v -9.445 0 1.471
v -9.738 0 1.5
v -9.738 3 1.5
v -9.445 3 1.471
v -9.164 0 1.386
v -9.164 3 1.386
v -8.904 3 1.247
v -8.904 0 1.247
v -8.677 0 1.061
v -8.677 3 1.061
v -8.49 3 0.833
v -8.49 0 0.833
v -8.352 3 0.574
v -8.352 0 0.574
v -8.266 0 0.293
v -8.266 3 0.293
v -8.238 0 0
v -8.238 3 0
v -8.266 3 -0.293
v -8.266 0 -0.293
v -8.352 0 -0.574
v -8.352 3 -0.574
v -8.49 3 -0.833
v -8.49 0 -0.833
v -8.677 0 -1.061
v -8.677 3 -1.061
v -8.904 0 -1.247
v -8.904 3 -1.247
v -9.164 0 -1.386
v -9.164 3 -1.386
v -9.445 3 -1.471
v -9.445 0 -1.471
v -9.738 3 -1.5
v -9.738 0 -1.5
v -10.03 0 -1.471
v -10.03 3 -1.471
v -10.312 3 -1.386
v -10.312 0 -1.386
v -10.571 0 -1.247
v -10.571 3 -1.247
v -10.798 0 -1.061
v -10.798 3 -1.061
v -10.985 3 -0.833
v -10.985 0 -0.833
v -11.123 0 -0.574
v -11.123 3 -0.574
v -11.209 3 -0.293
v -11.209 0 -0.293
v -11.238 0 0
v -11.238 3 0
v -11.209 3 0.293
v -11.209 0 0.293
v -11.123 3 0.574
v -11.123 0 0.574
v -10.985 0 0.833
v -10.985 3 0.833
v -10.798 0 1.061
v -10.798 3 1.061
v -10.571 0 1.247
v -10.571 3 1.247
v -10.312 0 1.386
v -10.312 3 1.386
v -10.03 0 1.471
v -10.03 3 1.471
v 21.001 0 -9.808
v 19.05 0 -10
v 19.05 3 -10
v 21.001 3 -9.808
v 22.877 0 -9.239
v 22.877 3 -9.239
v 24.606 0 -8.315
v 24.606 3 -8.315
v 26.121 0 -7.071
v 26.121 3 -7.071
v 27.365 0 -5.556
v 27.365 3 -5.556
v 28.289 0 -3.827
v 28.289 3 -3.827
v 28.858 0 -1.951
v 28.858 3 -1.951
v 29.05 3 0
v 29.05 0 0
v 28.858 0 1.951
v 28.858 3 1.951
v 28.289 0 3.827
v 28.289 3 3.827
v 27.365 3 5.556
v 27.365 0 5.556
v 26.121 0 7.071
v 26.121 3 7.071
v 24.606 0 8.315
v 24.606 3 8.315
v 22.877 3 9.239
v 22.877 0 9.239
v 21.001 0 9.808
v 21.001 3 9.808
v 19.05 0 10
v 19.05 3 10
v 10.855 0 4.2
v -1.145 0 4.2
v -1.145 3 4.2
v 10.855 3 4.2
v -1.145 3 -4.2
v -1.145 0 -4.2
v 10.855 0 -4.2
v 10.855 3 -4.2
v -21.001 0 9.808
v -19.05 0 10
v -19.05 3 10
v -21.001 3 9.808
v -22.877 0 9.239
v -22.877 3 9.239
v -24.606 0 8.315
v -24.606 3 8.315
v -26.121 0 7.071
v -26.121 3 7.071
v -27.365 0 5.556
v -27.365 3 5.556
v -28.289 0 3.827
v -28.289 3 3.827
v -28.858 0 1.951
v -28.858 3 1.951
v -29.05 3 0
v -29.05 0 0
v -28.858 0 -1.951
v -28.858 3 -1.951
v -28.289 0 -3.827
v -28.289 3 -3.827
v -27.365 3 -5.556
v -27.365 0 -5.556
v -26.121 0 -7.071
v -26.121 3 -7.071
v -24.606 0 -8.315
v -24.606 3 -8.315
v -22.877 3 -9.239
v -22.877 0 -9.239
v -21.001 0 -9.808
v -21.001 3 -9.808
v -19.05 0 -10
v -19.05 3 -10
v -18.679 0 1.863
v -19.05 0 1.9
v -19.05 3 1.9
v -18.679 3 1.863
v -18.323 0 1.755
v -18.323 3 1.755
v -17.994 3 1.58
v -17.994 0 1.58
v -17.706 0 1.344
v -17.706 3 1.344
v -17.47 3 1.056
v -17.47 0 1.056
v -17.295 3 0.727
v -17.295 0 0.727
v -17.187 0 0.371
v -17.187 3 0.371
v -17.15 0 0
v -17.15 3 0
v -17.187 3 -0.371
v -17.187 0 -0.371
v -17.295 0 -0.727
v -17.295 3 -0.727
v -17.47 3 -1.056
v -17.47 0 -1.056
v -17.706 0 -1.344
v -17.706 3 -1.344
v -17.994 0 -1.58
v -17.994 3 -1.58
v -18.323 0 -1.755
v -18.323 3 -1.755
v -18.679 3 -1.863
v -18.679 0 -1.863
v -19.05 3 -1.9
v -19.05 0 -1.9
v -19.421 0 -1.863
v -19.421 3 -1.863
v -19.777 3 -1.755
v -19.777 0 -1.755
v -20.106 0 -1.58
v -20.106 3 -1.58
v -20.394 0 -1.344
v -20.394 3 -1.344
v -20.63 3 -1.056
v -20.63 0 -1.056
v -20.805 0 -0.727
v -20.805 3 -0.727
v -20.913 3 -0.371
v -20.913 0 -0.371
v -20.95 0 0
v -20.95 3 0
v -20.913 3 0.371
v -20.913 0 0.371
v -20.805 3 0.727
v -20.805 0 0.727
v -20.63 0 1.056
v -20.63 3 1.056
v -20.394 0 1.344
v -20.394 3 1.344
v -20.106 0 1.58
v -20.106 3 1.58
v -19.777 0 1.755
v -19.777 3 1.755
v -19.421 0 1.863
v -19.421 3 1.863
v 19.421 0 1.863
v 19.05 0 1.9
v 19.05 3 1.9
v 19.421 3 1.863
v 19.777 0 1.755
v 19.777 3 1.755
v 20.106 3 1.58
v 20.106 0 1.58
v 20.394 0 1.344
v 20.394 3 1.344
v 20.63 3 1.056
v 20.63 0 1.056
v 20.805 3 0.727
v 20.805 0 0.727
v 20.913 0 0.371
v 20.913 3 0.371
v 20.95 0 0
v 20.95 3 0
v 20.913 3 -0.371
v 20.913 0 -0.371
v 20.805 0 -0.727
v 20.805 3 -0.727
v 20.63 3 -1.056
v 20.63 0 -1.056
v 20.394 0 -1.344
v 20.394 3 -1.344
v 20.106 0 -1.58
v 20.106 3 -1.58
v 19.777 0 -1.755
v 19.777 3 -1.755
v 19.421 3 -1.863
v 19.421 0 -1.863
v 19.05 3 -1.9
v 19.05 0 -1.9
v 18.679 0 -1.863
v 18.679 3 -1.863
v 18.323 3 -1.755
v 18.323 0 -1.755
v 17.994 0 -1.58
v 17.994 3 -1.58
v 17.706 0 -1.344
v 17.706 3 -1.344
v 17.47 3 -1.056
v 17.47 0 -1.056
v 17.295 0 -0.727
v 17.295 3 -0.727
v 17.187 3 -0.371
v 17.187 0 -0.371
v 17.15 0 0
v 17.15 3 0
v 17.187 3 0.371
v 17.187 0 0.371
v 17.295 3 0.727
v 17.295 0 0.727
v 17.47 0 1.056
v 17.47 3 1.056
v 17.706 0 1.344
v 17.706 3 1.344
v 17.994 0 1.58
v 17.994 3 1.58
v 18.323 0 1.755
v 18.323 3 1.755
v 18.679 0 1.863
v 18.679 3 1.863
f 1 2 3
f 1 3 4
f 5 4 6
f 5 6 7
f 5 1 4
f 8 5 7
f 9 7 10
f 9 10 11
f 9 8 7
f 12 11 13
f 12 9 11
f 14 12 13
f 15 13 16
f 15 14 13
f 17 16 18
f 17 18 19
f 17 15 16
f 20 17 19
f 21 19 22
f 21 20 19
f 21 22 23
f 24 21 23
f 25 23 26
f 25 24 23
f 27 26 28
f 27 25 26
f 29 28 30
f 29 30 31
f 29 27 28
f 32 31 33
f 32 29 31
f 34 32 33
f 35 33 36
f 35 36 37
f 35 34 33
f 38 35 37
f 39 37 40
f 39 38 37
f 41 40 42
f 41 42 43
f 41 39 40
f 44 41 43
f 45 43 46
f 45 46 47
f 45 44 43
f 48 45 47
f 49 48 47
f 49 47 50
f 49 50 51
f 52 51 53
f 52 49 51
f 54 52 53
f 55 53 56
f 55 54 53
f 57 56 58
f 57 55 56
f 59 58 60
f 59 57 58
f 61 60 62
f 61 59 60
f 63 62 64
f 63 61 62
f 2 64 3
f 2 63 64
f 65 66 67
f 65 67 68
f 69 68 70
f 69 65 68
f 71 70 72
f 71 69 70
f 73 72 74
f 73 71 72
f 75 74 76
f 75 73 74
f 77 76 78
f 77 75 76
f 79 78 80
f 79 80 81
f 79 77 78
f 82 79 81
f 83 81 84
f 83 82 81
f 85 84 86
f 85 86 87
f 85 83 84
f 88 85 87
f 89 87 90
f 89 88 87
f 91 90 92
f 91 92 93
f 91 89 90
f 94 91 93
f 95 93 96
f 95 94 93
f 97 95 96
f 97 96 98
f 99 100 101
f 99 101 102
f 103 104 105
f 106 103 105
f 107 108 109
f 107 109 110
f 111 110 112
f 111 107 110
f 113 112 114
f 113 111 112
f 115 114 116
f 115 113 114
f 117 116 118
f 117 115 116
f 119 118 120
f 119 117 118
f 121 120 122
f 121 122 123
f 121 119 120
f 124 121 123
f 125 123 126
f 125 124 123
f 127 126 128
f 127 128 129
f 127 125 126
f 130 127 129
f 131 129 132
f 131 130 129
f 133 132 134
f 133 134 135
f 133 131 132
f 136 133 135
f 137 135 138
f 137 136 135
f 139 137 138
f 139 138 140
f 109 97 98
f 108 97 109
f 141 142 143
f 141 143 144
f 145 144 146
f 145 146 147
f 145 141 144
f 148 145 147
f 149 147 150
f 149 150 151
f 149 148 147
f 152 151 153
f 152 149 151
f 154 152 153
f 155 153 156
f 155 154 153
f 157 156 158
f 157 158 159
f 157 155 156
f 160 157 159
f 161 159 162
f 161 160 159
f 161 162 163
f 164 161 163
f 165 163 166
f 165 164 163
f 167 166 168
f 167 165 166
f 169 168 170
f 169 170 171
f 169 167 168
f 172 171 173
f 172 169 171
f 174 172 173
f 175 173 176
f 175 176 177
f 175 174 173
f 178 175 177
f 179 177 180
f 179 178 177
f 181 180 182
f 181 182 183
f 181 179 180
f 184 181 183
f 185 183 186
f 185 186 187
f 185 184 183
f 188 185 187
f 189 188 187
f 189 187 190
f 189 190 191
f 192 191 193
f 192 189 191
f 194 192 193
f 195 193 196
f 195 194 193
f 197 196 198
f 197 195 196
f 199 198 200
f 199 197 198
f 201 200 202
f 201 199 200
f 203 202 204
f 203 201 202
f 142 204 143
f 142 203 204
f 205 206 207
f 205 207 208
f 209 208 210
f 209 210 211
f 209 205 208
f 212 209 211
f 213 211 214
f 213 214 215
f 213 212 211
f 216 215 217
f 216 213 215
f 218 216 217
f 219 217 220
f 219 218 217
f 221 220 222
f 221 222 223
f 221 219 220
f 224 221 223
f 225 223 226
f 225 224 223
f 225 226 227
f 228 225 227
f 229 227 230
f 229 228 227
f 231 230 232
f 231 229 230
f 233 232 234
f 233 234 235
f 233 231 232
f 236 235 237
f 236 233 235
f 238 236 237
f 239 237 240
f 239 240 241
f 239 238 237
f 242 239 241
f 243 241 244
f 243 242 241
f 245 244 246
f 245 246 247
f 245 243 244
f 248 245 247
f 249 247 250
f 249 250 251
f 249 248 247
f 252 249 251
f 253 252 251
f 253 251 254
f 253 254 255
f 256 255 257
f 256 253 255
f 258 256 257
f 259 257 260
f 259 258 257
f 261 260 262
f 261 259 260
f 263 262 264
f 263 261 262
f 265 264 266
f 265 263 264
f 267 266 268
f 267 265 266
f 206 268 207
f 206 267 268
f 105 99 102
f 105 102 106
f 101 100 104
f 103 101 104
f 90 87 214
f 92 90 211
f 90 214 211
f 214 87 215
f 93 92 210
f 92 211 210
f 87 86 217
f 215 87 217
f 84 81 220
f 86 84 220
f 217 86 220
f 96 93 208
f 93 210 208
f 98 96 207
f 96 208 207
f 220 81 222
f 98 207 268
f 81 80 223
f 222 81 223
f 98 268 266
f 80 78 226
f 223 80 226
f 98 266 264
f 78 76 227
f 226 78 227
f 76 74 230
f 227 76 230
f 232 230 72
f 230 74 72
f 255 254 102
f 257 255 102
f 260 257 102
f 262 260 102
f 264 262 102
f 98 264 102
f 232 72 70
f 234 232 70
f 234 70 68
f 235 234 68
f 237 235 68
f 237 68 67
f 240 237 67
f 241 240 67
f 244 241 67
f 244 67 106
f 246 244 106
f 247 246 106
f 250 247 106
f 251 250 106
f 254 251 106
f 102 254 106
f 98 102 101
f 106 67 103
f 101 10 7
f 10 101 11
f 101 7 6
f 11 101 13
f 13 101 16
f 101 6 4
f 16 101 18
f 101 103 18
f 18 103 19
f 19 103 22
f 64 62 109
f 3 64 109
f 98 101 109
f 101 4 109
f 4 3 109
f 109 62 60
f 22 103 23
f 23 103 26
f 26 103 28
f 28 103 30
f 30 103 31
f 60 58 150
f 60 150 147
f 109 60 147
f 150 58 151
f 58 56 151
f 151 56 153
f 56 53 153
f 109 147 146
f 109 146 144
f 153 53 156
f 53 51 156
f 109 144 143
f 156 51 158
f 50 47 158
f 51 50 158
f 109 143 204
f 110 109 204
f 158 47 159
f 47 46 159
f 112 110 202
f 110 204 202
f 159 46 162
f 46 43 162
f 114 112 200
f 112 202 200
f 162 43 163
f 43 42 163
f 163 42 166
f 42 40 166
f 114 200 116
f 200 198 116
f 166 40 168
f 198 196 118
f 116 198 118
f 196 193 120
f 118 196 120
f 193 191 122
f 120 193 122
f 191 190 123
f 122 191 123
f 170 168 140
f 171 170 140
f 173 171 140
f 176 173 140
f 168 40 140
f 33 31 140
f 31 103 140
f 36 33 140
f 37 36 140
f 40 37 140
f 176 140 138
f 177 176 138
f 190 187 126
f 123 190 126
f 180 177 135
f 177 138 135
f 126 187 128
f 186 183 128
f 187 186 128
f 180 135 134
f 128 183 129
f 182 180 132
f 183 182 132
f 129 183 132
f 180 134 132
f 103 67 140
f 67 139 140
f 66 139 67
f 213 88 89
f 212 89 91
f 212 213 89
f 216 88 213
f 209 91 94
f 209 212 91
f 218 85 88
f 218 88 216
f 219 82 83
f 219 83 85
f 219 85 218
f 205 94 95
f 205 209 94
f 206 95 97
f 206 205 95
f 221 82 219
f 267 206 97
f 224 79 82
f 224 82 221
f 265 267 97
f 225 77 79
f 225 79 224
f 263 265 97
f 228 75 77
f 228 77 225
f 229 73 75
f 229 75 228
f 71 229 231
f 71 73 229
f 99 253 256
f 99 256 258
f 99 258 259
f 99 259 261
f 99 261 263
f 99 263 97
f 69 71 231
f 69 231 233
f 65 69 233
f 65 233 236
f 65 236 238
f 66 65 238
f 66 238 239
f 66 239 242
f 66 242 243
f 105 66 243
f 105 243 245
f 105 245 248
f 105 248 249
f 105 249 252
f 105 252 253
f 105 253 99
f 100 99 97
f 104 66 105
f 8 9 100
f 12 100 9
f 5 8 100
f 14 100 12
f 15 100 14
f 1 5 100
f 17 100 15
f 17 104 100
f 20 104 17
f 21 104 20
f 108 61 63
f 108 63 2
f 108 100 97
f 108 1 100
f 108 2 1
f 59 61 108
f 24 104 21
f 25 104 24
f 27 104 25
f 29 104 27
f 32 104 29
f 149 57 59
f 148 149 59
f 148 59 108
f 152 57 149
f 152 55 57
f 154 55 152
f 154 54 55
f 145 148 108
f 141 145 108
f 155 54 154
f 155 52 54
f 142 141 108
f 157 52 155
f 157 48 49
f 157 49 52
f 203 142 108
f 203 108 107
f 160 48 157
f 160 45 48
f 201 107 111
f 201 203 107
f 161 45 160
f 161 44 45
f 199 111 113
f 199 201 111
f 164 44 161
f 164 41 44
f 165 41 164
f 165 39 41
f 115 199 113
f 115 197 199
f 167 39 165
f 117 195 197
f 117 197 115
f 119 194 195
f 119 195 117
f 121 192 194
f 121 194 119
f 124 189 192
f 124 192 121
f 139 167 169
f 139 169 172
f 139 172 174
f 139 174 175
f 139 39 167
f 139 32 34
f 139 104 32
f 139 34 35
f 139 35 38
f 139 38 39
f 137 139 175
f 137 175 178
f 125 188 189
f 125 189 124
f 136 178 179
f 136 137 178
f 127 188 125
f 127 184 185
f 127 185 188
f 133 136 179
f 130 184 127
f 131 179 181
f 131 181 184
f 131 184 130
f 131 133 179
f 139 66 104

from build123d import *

# Parameters (mm, degrees)
SKETCH1_R           = 1.5
SKETCH1_R_2         = 1.9
SKETCH1_W           = 12
SKETCH1_H           = 8.4
BOSS_EXTRUDE1_DEPTH = 3


with BuildPart() as part:
    # Sketch1 → Boss-Extrude1 (new body)
    with BuildSketch(Plane(origin=(0, 0, 0), x_dir=(1, 0, 0), z_dir=(0, 1, 0))):
        with BuildLine():
            Line((-19.05, 10), (19.05, 10))
            ThreePointArc((19.05, 10), (29.05, 0), (19.05, -10))
            Line((19.05, -10), (-19.05, -10))
            ThreePointArc((-19.05, -10), (-29.05, 0), (-19.05, 10))
        make_face()
        with Locations(Location((-9.73765424, 0, 0), (0, 0, 270))):
            Circle(SKETCH1_R, mode=Mode.SUBTRACT)
        with Locations(Location((-19.05, 0, 0), (0, 0, 270))):
            Circle(SKETCH1_R_2, mode=Mode.SUBTRACT)
        with Locations(Location((19.05, 0, 0), (0, 0, 270))):
            Circle(SKETCH1_R_2, mode=Mode.SUBTRACT)
        with Locations((4.854803124, 0)):
            Rectangle(SKETCH1_W, SKETCH1_H, mode=Mode.SUBTRACT)
    extrude(amount=BOSS_EXTRUDE1_DEPTH)


solid = part.part
